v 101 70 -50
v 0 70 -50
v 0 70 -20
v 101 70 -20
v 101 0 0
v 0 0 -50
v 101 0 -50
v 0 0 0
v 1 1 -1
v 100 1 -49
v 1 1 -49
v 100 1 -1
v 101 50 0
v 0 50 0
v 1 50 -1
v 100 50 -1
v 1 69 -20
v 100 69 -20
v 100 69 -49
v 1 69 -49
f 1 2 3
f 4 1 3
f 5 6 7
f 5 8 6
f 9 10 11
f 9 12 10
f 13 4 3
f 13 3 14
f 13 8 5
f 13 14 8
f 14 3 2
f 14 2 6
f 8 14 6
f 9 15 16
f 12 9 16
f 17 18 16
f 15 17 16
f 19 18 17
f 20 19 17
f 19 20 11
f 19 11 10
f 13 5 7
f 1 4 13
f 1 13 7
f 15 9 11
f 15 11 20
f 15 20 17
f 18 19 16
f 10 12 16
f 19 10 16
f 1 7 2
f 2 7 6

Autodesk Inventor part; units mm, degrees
sketch "Sketch1" plane through (0, 0, 0) normal (0, 0, 1) x (1, 0, 0)
  line L0 (0, 0) -> (100, 0)
  line L1 (100, 0) -> (100, 50)
  line L2 (100, 50) -> (0, 50)
  line L3 (0, 50) -> (0, 0)
  dimension "d0" = 100
  dimension "d1" = 50
sketch "Sketch2" plane through (0, 0, 0) normal (0, 1, 0) x (-1, 0, 0)
  line L0 (0, 0) -> (-100, 0)
  line L1 (-100, 0) -> (-100, -50)
  line L2 (-100, -50) -> (0, -50)
  line L3 (0, -50) -> (0, 0)
  dimension "d2" = 100
  dimension "d3" = 50
sketch "Sketch3" plane through (0, 0, 0) normal (1, 0, 0) x (0, 1, 0)
  line L0 (0, 0) -> (50, 0)
  line L1 (50, 0) -> (50, -50)
  line L2 (50, -50) -> (0, -50)
  line L3 (0, -50) -> (0, 0)
  line L4 (50, -50) -> (70, -50)
  line L5 (70, -50) -> (70, -20)
  line L6 (70, -20) -> (50, -20)
  line L7 (70, -20) -> (50, 0)
  line L8 (70, -20) -> (69, -20)
  line L9 (50, 0) -> (50, -1)
  line L10 (50, -1) -> (69, -20)
  dimension "d16" = 50
  dimension "d17" = 50
  dimension "d18" = 20
  dimension "d19" = 30
  dimension "d20" = 1
extrude "Extrusion1" add sketch "Sketch1" against normal blind 1
extrude "Extrusion2" add sketch "Sketch2" along normal blind 1
extrude "Extrusion3" add sketch "Sketch3" along normal blind 1
ref_plane "Work Plane1" through (100, 0, 0) normal (1, 0, 0) x (0, 1, 0)
sketch "Sketch4" plane through (100, 0, 0) normal (1, 0, 0) x (0, 1, 0)
  line L0 (0, 0) -> (0, -50)
  line L1 (70, -50) -> (70, -20) projected
  line L2 (0, -50) -> (70, -50)
  line L3 (70, -50) -> (70, -20)
  line L4 (50, 0) -> (50, -1) projected
  line L5 (50, 0) -> (50, -1)
  line L6 (50, -1) -> (69, -20)
  line L7 (69, -20) -> (70, -20)
  line L8 (0, -50) -> (50, -50)
  line L9 (1, -50) -> (70, -50) projected
  line L10 (50, -1) -> (50, -50)
  line L11 (0, 0) -> (50, 0) projected
  line L12 (0, 0) -> (50, 0)
  point P0 (-1, 0)
extrude "Extrusion4" add sketch "Sketch4" along normal blind 1
ref_plane "Work Plane2" through (0, 0, -50) normal (0, 0, 1) x (1, 0, 0)
sketch "Sketch5" plane through (0, 0, -50) normal (0, 0, 1) x (1, 0, 0)
  line L0 (101, 0) -> (101, 70) projected
  line L1 (0, 0) -> (101, 0)
  line L2 (101, 0) -> (101, 70)
  line L3 (101, 70) -> (0, 70)
  line L4 (0, 70) -> (0, 0)
  dimension "d27" = 101
  dimension "d28" = 70
sketch "Sketch6" plane through (101, 0, 0) normal (1, 0, 0) x (0, 0, -1)
  line L0 (1, 50) -> (0, 50) projected
  line L1 (20, 69) -> (1, 50) projected
  line L2 (0, 50) -> (1, 50)
  line L3 (1, 50) -> (20, 69)
  line L4 (20, 70) -> (20, 69) projected
  line L5 (20, 69) -> (20, 70)
  line L6 (20, 70) -> (0, 50)
  point P0 (0, 0)
extrude "Extrusion5" add sketch "Sketch6" against normal blind 100
extrude "Extrusion6" add sketch "Sketch5" along normal blind 1
ref_plane "Work Plane3" through (0, 70, 0) normal (0, 1, 0) x (-1, 0, 0)
sketch "Sketch7" plane through (0, 70, 0) normal (0, 1, 0) x (-1, 0, 0)
  line L0 (0, -50) -> (-101, -50) projected
  line L1 (-101, -50) -> (-101, -20) projected
  line L2 (0, -50) -> (-101, -50)
  line L3 (-101, -50) -> (-101, -20)
  line L4 (-101, -20) -> (0, -20)
  line L5 (0, -20) -> (0, -50)
  point P0 (0, 0)
extrude "Extrusion7" add sketch "Sketch7" against normal blind 1
properties part number "Design inkubator"
